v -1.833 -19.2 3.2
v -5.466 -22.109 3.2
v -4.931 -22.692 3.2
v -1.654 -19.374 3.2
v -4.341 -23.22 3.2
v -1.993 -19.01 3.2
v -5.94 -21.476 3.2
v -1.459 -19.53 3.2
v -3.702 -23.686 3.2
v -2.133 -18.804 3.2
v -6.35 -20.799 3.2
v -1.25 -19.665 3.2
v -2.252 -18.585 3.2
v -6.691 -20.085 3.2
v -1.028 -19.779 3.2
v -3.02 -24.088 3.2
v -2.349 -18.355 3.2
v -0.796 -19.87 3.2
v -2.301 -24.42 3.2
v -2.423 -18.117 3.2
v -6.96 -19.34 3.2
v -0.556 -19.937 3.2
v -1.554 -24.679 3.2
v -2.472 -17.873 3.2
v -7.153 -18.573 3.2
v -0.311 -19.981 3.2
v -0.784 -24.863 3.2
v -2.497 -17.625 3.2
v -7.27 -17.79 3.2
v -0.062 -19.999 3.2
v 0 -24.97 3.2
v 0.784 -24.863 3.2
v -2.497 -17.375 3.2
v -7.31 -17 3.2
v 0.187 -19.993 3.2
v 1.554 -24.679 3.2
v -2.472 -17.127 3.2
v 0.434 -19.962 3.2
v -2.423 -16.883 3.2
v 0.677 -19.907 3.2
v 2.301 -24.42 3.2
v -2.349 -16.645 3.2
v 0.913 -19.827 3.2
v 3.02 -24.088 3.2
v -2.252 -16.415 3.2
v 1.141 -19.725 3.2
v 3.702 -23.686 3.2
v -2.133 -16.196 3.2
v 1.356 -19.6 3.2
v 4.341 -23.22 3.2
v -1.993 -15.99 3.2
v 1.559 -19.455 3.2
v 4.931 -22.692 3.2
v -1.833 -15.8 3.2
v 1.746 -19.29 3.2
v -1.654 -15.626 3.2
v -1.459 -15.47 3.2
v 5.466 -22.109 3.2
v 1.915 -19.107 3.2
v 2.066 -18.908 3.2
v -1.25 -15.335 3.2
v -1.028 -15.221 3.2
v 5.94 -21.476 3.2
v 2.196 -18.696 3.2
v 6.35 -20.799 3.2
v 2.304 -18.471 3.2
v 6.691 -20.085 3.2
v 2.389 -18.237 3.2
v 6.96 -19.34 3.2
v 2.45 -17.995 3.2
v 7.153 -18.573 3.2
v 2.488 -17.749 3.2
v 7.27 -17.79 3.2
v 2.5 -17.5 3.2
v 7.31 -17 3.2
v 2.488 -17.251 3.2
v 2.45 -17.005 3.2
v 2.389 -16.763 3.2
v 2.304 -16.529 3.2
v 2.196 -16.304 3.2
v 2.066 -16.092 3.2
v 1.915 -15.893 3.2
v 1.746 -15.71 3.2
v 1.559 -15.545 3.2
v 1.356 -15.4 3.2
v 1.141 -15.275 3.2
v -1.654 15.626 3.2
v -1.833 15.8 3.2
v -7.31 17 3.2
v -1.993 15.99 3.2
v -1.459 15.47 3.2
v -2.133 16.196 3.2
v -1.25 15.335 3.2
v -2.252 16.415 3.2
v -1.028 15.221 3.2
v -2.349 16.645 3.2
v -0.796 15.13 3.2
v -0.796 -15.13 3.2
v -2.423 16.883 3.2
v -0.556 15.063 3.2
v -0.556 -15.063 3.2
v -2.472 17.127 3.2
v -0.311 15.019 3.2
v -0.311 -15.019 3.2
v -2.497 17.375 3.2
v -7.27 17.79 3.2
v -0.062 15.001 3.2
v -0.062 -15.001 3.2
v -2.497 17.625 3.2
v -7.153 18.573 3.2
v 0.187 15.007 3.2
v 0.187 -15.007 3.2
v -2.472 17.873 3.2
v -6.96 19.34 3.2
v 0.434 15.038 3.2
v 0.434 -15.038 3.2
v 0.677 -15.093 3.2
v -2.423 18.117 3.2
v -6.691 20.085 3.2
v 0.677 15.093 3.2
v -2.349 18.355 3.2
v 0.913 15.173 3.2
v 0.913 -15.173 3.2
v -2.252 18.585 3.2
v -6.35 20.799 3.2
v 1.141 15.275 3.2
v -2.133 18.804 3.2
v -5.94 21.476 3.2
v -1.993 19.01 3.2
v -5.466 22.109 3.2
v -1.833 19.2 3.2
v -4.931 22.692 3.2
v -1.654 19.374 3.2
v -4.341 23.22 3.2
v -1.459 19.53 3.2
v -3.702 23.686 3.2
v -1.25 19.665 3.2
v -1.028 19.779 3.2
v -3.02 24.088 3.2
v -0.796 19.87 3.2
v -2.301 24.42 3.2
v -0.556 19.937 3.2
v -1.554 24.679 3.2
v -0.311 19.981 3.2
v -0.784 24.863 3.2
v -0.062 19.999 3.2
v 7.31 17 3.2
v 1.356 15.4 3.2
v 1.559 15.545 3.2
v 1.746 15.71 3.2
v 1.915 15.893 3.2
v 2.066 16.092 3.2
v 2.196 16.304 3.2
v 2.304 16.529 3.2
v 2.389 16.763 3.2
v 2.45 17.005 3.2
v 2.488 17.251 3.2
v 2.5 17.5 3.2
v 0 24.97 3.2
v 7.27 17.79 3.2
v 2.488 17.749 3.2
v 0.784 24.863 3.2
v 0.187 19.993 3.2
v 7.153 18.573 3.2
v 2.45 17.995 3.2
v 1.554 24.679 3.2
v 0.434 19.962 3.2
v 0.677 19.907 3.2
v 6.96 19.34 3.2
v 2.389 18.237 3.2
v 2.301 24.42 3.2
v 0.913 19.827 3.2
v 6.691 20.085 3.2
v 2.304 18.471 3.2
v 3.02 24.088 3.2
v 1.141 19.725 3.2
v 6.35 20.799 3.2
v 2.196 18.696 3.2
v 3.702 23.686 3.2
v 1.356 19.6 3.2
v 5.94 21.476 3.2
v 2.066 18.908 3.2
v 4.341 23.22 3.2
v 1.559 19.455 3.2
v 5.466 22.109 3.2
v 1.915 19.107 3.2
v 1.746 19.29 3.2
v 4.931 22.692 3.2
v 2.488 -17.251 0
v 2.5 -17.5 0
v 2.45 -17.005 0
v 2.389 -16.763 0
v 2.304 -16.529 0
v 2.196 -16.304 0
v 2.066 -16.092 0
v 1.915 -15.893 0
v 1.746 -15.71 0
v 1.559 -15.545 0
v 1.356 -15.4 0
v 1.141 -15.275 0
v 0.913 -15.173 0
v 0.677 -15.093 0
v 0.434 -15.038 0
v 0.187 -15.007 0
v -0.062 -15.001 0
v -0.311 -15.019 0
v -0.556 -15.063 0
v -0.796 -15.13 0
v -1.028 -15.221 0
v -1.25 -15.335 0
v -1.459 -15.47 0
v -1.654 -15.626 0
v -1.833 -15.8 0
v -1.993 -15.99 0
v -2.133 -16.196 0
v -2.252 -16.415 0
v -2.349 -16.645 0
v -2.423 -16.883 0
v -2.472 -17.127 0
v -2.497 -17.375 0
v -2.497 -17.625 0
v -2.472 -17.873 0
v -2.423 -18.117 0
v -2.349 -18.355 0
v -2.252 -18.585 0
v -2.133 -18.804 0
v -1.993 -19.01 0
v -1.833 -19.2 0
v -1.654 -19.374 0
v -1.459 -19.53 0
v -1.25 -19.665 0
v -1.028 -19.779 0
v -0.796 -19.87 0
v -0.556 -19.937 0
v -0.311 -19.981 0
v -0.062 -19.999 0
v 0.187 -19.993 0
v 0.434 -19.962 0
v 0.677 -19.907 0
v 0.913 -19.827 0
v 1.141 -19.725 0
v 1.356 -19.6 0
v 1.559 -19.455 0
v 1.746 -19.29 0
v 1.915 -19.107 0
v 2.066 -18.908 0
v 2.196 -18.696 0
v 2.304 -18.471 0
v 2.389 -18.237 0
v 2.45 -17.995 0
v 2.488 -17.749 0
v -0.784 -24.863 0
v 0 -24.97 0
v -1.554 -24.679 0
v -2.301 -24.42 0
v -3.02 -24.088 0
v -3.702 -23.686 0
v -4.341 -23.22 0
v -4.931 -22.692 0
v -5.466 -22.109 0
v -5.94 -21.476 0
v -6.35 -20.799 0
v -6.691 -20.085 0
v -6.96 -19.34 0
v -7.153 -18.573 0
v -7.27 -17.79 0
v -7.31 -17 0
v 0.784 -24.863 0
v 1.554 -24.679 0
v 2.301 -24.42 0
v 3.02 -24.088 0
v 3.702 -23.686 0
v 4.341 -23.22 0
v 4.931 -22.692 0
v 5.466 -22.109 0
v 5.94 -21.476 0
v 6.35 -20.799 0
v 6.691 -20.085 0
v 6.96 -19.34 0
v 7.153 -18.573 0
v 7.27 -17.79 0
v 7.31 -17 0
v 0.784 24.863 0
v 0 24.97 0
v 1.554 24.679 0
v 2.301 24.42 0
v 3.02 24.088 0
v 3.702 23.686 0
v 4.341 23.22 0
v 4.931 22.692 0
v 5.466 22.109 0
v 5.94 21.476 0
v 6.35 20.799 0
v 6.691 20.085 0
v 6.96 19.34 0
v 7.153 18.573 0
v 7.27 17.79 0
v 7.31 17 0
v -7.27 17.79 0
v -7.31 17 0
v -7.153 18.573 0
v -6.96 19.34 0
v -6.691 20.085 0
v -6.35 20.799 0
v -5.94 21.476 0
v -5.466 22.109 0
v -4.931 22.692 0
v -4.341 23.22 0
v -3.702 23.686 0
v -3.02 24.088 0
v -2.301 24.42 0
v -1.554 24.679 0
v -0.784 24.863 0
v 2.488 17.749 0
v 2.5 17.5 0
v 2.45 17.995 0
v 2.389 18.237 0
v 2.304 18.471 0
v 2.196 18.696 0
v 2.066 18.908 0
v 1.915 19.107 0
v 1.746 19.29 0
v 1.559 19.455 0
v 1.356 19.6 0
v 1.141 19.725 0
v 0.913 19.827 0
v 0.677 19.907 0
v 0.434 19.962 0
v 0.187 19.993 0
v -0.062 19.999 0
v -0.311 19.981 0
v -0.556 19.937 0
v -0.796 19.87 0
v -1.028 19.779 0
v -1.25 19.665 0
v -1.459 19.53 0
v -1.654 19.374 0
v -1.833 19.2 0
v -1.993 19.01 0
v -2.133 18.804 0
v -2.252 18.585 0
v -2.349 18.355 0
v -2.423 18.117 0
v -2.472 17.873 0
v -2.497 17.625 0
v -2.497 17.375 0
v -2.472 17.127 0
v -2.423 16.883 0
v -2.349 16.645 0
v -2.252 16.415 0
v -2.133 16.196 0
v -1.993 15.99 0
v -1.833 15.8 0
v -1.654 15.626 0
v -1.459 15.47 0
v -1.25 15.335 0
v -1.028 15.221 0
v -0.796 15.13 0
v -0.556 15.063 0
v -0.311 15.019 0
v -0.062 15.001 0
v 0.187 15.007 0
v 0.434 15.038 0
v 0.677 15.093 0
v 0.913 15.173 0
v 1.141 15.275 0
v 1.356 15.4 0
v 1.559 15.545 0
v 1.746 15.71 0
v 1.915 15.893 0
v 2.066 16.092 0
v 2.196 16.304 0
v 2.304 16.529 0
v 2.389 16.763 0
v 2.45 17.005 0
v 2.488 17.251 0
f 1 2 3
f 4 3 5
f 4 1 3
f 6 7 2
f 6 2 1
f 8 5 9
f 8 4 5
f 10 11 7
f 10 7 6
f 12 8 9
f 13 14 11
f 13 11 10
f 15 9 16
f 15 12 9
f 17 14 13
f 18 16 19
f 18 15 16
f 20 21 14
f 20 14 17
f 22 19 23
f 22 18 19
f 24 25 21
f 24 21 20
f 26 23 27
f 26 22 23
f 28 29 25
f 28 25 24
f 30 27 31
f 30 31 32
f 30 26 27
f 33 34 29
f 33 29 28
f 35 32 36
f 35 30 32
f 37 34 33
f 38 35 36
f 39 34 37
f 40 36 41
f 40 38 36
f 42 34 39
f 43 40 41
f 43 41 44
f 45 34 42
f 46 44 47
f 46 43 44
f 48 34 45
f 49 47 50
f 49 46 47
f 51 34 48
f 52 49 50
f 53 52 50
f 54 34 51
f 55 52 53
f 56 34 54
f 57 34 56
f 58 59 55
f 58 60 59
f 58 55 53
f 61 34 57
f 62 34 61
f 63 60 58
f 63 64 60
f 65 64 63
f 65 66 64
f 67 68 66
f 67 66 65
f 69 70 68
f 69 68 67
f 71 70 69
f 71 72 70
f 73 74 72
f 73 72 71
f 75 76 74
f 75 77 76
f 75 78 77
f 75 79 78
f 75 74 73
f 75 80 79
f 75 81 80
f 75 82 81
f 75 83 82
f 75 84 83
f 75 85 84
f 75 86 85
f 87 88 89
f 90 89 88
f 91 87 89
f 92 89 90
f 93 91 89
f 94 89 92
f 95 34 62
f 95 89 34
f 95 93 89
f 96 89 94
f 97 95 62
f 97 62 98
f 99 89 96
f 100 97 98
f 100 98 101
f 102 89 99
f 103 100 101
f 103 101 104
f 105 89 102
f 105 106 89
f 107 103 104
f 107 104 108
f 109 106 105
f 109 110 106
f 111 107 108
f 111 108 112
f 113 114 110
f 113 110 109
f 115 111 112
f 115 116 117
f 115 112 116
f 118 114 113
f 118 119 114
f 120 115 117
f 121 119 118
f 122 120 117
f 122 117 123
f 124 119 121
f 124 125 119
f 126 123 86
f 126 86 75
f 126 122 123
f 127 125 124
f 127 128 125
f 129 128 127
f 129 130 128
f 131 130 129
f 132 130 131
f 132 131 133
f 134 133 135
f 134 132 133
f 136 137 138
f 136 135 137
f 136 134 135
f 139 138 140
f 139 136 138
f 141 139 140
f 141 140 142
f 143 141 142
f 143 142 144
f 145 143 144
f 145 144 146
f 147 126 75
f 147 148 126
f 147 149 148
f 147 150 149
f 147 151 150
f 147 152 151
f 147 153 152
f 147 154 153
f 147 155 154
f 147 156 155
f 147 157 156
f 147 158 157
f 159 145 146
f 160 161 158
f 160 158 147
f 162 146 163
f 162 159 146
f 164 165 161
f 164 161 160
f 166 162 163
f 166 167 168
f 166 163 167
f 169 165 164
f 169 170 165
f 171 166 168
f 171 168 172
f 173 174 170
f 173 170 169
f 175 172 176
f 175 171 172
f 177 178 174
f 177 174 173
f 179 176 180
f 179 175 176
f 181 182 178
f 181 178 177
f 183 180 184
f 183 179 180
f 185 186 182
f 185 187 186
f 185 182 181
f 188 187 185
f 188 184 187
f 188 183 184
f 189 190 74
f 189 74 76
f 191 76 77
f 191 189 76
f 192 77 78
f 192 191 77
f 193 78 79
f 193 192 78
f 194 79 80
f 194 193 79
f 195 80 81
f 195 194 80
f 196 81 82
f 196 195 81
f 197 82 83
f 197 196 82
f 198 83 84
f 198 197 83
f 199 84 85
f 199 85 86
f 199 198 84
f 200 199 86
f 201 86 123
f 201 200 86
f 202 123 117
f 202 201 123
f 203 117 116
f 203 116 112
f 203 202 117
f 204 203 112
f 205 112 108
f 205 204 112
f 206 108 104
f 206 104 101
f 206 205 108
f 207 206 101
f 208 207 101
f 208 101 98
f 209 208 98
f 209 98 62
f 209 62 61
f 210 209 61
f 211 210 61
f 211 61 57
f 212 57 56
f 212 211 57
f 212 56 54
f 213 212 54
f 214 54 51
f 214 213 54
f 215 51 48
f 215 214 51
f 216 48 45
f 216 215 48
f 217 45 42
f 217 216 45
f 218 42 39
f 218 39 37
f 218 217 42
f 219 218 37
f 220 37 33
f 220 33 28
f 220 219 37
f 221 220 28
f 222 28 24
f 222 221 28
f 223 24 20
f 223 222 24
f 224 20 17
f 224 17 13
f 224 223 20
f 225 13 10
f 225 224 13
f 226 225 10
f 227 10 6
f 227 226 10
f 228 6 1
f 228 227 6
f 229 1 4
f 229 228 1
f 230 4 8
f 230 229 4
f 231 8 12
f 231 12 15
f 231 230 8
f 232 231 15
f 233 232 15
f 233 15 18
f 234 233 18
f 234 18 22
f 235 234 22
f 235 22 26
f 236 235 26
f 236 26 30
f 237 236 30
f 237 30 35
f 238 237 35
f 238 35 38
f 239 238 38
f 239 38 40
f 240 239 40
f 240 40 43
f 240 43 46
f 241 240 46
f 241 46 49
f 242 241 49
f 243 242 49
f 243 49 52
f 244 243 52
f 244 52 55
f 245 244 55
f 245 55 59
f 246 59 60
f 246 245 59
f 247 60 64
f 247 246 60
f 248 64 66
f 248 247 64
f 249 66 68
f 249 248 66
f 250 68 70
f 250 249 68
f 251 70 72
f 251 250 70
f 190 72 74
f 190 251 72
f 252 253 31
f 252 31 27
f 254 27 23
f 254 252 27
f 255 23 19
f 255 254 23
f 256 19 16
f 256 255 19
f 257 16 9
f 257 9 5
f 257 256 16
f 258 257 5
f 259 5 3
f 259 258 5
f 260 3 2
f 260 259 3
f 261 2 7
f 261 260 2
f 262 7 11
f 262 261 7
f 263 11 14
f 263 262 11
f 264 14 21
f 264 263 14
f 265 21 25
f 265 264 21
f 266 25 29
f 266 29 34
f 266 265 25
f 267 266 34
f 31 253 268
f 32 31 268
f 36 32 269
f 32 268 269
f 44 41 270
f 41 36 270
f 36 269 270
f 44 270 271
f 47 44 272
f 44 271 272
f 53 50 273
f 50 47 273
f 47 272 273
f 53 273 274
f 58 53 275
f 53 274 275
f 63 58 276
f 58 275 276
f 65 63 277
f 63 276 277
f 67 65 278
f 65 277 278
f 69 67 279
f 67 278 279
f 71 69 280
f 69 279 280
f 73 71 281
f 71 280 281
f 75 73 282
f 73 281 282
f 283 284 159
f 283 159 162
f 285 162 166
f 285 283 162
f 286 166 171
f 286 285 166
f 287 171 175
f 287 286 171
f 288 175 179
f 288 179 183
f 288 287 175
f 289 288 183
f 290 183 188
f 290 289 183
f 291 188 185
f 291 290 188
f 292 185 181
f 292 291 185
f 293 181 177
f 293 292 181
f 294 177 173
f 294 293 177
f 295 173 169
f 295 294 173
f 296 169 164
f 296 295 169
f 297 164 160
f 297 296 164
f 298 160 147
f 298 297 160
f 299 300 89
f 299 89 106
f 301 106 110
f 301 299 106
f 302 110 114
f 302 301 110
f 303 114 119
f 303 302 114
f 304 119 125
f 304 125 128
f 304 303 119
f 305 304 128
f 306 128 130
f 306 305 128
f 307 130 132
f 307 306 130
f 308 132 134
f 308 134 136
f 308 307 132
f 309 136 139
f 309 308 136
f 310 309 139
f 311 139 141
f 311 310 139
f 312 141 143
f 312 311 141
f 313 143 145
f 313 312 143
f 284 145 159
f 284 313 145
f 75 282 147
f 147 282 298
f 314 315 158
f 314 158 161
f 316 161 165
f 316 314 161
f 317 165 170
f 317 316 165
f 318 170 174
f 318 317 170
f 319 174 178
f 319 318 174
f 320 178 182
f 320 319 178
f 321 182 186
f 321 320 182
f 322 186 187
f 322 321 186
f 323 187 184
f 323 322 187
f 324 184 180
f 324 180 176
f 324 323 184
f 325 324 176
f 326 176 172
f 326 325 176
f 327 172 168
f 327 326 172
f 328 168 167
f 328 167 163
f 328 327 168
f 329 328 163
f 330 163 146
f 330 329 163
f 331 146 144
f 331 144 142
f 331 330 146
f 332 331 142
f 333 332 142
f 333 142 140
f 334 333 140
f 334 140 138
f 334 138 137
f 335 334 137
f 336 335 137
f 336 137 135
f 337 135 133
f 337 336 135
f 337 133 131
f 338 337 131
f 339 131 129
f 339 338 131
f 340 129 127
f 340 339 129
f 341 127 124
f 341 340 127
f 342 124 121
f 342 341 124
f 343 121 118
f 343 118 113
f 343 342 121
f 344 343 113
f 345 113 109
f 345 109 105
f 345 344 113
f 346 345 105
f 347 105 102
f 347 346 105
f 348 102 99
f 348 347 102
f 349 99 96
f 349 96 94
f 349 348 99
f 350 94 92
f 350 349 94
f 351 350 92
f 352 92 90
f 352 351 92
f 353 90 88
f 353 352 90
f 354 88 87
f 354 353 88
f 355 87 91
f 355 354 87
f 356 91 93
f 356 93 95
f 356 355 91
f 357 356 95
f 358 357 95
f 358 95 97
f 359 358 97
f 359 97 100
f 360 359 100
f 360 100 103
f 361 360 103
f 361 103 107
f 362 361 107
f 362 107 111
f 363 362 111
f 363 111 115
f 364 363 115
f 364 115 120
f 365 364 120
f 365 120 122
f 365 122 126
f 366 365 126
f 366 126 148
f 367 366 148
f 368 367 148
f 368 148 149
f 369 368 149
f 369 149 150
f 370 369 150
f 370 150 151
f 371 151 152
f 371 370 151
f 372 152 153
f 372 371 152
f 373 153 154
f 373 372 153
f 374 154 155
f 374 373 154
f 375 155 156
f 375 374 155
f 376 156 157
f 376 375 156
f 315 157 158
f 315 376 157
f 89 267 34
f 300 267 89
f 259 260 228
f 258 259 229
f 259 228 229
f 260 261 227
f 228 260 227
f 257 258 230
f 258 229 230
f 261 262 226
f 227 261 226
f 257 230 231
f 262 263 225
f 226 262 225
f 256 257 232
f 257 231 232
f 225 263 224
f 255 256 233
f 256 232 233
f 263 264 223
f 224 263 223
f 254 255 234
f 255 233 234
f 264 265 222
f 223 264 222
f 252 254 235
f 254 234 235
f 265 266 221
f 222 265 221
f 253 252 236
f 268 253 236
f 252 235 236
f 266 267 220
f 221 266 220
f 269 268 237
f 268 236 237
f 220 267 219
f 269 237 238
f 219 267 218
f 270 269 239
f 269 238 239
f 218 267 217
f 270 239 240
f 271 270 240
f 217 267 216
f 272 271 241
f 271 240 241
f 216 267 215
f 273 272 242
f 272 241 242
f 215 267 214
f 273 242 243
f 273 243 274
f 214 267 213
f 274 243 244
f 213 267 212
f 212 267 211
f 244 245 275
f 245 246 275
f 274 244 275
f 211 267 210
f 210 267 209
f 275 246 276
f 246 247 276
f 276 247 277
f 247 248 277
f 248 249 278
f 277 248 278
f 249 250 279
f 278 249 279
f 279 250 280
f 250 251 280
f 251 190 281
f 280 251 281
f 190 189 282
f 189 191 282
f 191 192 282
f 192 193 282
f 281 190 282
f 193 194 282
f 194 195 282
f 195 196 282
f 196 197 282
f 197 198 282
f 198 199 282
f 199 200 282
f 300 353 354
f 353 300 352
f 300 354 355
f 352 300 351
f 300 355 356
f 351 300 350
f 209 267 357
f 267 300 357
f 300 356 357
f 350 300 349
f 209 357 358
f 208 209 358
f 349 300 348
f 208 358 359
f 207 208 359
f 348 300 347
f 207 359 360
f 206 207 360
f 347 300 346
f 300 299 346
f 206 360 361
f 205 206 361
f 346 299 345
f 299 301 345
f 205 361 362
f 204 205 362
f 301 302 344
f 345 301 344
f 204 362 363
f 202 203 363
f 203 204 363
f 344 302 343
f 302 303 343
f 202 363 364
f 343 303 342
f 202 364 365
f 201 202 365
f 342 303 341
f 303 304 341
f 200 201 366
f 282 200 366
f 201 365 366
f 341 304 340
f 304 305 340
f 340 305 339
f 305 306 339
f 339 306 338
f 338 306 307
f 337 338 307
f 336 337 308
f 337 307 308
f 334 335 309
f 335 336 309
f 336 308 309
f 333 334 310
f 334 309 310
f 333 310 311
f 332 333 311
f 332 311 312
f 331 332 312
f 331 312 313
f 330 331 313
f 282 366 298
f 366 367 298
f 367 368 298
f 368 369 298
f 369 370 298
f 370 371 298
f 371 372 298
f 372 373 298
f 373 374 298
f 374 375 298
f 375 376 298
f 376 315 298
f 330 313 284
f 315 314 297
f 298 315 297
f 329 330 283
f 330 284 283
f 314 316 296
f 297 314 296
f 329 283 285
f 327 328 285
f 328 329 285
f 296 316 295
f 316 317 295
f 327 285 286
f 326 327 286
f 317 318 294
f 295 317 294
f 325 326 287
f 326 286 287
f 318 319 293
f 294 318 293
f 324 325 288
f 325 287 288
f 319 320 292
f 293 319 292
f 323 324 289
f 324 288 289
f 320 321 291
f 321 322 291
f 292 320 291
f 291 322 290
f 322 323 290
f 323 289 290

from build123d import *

# Parameters (mm, degrees)
F0_W        = 14.6192193359
F0_H        = 50
F0_R        = 2.5
F1_DEPTH    = 3.2
F2_T1_DEPTH = 43.2
F3_T1_DEPTH = 43.2


# Not quite as in the source:
# - a fillet or chamfer that OpenCascade refuses, or shapes differently, is made with other operations: its cross-section is extruded or revolved along the edge and cut away or added


with BuildPart() as f1:
    # F0 (on Top) → F1 (new body)
    with BuildSketch(Plane.XY):
        Rectangle(F0_W, F0_H)
        with Locations((0, -17.5)):
            Circle(F0_R, mode=Mode.SUBTRACT)
        with Locations((0, 17.5)):
            Circle(F0_R, mode=Mode.SUBTRACT)
    extrude(amount=F1_DEPTH)

    # F2: fillet of radius 8 on 2 edges, made by hand

    # F2_s2 → F2_t1 (cut)
    with BuildSketch(Plane.XY.offset(-20)):
        with BuildLine():
            ThreePointArc((-0.6903903321, -25), (4.9664639174, -22.6568542495), (7.3096096679, -17))
            Line((7.3096096679, -17), (7.3096096679, -25))
            Line((7.3096096679, -25), (-0.6903903321, -25))
        make_face()
        with BuildLine():
            ThreePointArc((0.6903903321, -25), (-4.9664639174, -22.6568542495), (-7.3096096679, -17))
            Line((-7.3096096679, -17), (-7.3096096679, -25))
            Line((-7.3096096679, -25), (0.6903903321, -25))
        make_face()
    extrude(amount=F2_T1_DEPTH, mode=Mode.SUBTRACT)

    # F3: fillet of radius 8 on 2 edges, made by hand

    # F3_s2 → F3_t1 (cut)
    with BuildSketch(Plane.XY.offset(-20)):
        with BuildLine():
            ThreePointArc((-0.6903903321, 25), (4.9664639174, 22.6568542495), (7.3096096679, 17))
            Line((7.3096096679, 17), (7.3096096679, 25))
            Line((7.3096096679, 25), (-0.6903903321, 25))
        make_face()
        with BuildLine():
            ThreePointArc((-7.3096096679, 17), (-4.9664639174, 22.6568542495), (0.6903903321, 25))
            Line((0.6903903321, 25), (-7.3096096679, 25))
            Line((-7.3096096679, 25), (-7.3096096679, 17))
        make_face()
    extrude(amount=F3_T1_DEPTH, mode=Mode.SUBTRACT)


solid = f1.part
